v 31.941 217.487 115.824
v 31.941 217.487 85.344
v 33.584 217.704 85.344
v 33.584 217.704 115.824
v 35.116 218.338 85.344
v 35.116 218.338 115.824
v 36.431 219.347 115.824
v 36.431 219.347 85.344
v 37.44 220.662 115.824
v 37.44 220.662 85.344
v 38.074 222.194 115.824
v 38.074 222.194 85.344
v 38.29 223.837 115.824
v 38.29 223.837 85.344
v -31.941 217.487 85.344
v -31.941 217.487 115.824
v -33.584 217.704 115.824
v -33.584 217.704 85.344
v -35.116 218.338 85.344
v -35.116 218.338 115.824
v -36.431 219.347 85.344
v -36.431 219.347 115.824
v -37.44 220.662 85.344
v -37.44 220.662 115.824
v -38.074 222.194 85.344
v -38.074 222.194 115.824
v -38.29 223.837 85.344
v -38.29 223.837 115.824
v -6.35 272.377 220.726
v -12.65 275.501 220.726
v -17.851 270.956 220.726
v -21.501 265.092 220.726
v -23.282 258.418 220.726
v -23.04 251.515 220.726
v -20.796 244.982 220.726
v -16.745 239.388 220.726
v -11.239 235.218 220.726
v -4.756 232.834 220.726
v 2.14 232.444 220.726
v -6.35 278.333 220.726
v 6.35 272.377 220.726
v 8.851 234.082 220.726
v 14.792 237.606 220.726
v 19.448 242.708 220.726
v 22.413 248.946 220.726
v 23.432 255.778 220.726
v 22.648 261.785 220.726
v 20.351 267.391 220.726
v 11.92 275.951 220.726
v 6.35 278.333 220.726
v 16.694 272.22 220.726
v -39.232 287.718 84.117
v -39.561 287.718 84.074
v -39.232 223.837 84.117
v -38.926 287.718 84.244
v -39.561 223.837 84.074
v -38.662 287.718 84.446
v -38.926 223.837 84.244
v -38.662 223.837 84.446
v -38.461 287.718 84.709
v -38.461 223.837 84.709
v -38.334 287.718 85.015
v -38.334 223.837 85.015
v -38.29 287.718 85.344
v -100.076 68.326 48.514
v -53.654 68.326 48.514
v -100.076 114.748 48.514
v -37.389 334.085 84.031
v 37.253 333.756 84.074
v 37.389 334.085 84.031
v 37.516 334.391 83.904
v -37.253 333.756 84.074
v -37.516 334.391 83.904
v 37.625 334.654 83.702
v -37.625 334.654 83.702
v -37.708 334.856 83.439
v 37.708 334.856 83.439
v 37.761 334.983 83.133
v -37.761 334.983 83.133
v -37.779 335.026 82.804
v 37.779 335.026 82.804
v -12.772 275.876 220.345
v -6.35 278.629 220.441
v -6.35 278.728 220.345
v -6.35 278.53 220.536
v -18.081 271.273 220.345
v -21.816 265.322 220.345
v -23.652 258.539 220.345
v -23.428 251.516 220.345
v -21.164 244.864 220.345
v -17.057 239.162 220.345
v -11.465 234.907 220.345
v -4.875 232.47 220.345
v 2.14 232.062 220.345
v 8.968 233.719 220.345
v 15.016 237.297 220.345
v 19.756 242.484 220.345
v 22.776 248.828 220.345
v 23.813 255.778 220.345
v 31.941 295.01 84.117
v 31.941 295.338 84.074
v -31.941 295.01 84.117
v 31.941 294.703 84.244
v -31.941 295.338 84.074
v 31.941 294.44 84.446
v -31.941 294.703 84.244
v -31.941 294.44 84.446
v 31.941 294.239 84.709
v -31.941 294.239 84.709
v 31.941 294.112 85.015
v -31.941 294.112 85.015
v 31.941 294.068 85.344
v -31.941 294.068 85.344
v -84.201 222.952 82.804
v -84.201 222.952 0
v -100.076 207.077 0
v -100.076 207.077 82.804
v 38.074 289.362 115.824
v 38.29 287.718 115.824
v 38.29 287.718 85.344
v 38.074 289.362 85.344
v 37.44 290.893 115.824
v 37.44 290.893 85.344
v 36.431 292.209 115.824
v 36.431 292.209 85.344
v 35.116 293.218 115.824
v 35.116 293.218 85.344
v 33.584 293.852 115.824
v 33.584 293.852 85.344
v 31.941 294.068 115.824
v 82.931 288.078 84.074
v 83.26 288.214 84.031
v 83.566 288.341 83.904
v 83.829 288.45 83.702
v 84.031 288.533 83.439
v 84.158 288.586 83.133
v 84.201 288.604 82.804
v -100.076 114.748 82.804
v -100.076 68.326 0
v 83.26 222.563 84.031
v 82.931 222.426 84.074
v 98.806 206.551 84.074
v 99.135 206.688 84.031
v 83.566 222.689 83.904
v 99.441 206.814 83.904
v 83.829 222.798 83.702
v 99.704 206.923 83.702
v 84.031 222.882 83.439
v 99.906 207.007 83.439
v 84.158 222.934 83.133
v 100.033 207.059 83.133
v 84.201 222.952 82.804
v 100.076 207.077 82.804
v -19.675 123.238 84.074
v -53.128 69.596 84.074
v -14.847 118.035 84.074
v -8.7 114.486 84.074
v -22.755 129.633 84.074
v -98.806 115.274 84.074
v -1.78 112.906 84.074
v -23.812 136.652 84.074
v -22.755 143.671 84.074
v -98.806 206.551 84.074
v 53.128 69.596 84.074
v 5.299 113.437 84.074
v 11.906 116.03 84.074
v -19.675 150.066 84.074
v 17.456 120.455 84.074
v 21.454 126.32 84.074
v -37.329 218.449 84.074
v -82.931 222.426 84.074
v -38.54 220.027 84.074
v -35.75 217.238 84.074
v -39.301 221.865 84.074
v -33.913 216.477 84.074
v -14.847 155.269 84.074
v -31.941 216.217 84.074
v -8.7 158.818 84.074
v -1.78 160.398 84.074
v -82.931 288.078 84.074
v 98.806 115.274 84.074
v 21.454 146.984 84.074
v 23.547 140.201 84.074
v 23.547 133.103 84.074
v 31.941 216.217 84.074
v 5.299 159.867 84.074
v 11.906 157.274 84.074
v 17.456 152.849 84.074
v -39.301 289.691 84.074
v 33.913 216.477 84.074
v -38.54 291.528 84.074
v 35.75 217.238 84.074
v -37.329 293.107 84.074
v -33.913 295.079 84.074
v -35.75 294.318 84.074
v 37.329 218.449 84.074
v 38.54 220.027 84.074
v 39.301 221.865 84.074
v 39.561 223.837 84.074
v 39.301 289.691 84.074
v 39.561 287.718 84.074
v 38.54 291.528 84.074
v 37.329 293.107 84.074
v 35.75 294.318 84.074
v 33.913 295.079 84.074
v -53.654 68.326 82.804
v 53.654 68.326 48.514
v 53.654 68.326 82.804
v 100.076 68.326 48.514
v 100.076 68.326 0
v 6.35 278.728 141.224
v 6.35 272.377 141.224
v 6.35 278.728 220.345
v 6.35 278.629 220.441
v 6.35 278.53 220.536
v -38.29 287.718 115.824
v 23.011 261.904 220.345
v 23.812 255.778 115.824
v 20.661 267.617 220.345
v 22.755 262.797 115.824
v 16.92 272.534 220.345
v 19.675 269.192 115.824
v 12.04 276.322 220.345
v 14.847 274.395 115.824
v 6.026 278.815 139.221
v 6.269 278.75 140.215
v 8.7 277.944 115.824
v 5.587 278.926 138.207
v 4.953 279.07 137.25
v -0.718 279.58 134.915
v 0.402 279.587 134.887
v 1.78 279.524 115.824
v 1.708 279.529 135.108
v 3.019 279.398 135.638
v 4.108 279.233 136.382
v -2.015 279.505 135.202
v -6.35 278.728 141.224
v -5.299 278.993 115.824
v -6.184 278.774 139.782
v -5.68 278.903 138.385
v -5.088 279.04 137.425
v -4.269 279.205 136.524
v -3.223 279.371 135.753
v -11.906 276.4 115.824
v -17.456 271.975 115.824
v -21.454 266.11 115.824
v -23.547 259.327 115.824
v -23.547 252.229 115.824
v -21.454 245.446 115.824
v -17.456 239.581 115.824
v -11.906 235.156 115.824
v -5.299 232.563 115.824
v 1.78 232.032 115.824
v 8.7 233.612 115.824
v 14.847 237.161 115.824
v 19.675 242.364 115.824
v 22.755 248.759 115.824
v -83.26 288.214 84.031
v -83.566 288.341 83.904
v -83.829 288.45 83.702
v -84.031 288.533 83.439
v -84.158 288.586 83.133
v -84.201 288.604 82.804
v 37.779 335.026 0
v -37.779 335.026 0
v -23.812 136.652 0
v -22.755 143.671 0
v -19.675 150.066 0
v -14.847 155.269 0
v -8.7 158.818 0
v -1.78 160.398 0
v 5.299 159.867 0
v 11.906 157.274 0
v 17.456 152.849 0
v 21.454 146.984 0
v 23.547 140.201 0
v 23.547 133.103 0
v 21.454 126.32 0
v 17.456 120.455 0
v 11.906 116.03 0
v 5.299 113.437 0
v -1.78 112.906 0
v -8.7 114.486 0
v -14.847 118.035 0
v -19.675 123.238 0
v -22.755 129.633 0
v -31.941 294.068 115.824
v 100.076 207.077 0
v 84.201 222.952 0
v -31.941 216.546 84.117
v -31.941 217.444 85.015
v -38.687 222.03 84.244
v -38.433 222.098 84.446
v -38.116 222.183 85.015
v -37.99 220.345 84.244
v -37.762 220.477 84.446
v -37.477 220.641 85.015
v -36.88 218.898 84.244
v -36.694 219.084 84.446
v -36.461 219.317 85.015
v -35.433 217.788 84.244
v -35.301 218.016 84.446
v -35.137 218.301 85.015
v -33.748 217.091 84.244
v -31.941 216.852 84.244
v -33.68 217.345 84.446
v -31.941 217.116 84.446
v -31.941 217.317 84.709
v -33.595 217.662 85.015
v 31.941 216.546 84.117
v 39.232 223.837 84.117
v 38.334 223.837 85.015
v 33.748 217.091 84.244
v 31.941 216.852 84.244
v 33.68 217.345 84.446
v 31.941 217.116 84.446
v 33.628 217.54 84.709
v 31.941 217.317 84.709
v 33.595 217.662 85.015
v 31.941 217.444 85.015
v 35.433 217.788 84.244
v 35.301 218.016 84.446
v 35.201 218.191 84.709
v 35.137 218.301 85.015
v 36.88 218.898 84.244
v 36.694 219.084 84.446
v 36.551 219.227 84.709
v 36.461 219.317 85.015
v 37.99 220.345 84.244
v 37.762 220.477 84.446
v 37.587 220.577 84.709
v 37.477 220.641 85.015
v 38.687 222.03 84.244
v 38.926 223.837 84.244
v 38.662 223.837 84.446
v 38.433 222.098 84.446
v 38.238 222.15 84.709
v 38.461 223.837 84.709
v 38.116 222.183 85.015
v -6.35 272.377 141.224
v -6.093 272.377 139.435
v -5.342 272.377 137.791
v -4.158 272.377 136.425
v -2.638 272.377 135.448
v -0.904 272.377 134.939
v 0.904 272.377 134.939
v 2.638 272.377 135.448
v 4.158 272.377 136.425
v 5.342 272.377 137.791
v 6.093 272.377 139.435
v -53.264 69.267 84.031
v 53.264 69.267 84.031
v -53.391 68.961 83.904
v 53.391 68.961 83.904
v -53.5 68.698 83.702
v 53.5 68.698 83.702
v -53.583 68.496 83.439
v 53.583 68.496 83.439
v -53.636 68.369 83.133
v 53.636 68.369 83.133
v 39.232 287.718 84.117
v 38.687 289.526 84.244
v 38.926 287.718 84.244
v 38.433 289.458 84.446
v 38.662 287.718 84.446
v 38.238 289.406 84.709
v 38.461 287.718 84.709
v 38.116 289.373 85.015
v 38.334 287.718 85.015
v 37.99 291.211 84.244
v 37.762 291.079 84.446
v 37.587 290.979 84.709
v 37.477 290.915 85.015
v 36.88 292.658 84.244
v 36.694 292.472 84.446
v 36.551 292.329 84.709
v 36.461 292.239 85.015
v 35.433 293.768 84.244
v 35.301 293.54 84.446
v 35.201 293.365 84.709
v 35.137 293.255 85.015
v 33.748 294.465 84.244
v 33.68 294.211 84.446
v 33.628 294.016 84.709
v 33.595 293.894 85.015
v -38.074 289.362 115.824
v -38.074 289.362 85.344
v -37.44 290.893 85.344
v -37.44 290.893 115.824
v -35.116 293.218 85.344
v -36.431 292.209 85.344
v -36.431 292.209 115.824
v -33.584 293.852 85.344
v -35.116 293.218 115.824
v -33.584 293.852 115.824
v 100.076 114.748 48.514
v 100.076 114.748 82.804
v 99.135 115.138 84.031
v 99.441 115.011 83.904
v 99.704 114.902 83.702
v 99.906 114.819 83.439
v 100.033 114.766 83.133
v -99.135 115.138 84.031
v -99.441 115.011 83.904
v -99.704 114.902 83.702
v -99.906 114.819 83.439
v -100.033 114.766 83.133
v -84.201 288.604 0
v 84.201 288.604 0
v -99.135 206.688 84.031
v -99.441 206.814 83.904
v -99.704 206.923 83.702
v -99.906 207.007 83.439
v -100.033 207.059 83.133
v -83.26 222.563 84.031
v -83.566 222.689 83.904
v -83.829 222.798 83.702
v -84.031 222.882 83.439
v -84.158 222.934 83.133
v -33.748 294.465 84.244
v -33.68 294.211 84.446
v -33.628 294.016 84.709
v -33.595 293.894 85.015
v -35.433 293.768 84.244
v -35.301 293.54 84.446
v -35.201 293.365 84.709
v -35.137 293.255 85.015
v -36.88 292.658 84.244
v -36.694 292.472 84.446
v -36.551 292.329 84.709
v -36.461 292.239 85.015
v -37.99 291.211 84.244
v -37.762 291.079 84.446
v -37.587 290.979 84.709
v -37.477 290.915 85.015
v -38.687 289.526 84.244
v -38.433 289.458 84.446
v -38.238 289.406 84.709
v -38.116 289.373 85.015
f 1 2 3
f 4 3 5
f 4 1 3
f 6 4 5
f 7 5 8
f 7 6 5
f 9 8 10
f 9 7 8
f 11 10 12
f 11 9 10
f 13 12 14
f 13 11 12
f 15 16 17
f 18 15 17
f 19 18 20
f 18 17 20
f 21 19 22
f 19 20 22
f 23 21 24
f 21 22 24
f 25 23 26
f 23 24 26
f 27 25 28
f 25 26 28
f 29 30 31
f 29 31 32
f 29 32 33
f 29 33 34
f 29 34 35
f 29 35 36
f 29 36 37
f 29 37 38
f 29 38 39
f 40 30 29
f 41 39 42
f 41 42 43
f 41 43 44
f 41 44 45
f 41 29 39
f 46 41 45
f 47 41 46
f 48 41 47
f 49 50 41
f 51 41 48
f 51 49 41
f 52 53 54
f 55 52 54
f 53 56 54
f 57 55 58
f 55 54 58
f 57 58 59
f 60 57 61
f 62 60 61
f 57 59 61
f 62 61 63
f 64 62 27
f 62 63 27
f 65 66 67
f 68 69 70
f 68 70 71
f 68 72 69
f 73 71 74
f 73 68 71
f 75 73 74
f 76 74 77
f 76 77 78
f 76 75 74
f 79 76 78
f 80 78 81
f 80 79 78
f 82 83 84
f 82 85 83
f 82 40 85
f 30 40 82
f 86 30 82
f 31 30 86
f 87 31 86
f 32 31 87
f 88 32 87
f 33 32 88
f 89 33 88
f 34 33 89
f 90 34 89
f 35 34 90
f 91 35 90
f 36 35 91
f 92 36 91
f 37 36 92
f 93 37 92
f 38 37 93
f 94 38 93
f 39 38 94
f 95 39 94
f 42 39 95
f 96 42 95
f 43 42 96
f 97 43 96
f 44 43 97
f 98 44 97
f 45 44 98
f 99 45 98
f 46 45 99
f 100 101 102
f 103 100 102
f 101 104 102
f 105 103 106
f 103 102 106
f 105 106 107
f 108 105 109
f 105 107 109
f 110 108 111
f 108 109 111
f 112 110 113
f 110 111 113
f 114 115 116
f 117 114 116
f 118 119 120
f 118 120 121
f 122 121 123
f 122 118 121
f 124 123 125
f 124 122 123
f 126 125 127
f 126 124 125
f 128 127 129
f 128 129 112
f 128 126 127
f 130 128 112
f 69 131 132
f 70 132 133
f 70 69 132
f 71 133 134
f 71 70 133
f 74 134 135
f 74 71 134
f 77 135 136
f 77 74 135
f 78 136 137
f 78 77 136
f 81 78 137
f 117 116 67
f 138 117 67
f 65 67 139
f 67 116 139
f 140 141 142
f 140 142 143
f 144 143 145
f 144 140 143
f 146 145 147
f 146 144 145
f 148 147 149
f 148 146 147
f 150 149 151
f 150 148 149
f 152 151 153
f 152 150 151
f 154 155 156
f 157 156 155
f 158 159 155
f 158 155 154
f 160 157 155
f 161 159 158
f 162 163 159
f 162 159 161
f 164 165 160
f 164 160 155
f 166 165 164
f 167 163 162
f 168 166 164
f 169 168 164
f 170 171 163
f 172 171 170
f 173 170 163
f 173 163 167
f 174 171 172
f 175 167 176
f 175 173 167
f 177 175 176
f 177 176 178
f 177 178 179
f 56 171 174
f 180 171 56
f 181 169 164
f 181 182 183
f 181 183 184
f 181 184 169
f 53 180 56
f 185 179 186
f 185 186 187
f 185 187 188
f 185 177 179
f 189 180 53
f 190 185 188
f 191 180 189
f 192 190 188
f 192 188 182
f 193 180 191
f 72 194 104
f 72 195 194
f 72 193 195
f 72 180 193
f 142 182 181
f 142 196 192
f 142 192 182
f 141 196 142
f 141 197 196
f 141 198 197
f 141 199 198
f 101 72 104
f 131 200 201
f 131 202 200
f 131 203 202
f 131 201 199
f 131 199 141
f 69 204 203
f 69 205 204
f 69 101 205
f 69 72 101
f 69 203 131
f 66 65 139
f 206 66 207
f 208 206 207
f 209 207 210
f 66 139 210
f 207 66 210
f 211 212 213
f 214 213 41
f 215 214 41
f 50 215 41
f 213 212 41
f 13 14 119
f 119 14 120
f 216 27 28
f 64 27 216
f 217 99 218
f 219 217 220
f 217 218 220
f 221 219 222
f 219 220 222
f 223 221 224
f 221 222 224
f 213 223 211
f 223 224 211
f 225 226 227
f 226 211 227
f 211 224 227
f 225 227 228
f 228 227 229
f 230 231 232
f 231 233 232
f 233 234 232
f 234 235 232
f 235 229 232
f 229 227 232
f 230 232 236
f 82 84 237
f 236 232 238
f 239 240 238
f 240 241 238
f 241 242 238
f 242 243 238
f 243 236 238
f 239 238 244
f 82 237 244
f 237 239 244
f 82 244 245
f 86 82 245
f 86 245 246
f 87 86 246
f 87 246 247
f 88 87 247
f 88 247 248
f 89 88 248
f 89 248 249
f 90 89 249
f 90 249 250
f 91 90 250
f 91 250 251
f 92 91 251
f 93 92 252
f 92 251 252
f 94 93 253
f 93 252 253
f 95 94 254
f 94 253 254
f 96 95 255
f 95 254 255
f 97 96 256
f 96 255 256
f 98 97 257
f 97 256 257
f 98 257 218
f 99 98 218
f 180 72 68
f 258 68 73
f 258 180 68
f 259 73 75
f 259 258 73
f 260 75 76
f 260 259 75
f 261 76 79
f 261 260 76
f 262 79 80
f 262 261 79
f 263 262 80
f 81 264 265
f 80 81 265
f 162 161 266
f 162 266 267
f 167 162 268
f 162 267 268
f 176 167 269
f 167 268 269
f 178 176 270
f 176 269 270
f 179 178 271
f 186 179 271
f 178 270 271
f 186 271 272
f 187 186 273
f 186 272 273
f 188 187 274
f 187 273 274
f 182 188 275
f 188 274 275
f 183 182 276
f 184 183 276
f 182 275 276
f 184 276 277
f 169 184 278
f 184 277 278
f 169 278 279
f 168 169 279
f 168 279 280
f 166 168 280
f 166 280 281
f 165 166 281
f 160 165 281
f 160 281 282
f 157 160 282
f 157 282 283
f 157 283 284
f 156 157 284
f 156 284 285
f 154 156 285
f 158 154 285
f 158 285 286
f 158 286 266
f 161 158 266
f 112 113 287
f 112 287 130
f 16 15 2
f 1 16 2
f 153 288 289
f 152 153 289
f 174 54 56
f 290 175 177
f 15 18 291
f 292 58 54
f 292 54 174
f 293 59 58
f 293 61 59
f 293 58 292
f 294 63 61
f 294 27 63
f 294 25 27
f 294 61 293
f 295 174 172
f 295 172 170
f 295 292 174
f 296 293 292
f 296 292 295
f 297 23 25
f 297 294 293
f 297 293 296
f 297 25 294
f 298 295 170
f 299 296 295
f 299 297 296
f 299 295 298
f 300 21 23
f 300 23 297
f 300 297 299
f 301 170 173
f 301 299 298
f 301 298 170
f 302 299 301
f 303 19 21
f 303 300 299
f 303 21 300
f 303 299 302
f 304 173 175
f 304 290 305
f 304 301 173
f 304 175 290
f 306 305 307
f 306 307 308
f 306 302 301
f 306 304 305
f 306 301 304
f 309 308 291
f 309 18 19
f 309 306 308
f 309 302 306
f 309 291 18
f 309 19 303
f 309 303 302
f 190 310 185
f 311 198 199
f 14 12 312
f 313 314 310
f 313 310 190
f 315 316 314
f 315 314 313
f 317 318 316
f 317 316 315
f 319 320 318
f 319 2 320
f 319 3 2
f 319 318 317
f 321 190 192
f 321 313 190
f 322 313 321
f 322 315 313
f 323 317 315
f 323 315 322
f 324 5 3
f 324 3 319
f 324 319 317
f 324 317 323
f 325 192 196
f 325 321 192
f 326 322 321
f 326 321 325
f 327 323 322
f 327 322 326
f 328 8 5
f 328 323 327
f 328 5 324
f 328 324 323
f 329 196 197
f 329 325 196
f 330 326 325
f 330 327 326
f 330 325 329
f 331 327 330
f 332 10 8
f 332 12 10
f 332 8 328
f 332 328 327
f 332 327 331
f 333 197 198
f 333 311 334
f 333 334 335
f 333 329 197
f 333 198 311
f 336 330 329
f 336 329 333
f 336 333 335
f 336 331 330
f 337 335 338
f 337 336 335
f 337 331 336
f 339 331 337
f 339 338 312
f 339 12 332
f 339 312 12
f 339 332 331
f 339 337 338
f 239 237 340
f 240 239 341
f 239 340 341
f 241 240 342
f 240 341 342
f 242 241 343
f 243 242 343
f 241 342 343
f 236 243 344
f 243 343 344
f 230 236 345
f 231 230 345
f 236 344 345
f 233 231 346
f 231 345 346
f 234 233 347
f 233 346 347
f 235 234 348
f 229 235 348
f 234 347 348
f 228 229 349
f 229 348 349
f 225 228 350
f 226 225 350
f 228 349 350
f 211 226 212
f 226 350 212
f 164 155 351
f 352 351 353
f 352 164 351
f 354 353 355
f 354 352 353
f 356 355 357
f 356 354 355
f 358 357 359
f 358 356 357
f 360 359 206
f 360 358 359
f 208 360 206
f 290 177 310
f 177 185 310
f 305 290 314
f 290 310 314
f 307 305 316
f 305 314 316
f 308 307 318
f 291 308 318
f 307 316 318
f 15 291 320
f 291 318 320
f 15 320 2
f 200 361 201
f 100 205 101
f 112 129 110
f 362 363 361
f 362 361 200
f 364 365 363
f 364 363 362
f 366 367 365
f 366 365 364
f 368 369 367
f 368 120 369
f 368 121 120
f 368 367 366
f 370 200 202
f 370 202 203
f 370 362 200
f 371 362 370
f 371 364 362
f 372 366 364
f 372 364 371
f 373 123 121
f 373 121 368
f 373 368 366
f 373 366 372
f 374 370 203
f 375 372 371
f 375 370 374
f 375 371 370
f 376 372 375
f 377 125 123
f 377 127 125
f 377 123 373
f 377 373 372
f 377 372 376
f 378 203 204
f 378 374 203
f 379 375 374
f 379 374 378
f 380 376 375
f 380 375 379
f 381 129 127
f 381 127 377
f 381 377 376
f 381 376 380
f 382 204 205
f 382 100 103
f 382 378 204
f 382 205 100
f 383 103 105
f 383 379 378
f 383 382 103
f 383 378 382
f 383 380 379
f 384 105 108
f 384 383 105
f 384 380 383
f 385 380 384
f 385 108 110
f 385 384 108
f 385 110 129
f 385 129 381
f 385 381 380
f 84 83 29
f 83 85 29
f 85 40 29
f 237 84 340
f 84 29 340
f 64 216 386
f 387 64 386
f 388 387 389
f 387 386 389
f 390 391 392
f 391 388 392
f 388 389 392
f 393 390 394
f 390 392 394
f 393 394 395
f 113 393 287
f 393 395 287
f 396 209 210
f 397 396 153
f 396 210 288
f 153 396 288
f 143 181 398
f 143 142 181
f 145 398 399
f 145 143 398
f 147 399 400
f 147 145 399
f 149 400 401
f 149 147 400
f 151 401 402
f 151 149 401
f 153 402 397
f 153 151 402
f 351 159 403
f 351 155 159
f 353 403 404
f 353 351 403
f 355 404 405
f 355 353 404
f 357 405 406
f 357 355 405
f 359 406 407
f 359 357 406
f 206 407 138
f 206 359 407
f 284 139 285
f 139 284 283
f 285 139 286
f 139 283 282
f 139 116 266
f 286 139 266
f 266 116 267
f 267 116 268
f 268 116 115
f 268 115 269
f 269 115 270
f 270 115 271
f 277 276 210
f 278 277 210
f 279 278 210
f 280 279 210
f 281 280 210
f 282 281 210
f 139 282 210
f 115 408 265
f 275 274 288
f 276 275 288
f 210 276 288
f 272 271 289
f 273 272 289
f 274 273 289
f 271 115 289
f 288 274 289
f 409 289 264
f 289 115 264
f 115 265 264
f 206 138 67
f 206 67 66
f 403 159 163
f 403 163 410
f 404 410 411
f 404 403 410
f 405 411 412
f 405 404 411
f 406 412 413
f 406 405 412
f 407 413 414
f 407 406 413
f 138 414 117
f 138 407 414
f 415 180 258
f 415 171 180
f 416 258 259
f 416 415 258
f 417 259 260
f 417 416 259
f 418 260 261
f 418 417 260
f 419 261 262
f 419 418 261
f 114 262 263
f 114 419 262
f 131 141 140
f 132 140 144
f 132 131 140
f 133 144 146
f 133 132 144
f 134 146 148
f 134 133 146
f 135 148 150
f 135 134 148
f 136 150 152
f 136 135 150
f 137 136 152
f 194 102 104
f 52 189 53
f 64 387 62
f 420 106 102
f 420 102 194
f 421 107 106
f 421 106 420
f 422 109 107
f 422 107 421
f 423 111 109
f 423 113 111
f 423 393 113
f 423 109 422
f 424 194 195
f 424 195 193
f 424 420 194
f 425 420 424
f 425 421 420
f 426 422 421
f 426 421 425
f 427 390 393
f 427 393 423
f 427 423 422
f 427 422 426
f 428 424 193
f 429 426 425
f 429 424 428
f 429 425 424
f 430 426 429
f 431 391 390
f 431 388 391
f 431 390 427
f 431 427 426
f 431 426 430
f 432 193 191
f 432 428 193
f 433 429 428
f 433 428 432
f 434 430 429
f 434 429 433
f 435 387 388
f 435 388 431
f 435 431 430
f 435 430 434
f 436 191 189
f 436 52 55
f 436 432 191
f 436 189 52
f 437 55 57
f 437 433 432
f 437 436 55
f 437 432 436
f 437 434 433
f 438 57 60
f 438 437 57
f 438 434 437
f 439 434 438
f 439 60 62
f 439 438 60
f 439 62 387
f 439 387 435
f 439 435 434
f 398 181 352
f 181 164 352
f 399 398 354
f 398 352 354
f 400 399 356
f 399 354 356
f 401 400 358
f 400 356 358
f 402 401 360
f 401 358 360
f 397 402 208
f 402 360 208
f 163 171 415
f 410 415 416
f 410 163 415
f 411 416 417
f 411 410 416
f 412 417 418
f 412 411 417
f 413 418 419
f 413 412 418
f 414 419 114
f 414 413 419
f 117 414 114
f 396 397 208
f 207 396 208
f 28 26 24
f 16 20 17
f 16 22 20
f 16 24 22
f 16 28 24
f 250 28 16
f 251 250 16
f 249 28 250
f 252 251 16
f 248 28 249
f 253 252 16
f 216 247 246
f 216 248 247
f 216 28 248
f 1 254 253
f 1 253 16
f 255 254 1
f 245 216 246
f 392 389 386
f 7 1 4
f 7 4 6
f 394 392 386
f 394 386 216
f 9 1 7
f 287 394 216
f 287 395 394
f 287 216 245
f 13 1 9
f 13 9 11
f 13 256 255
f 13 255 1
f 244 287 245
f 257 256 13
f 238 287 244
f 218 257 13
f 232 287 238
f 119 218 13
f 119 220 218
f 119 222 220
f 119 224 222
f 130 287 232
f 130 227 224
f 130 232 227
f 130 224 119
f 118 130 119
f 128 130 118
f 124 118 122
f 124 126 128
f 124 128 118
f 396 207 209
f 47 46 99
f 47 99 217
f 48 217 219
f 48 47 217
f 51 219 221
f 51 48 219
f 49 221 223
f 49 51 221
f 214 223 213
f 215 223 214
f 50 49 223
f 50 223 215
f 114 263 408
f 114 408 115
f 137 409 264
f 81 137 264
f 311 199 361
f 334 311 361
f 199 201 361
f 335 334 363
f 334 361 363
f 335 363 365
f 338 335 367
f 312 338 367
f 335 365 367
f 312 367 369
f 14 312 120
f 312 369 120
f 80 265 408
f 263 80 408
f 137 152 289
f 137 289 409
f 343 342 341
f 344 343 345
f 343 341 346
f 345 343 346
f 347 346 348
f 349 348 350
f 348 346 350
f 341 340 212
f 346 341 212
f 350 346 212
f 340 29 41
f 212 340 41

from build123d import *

# Parameters (mm, degrees)
BOSS_EXTRUDE1_DEPTH = 84.074
SKETCH3_W           = 76.581
SKETCH3_H           = 76.581
BOSS_EXTRUDE2_DEPTH = 31.75
SKETCH_D_R          = 23.8125
BOSS_EXTRUDE3_DEPTH = 104.902
CUT_EXTRUDE1_DEPTH  = 35.56
FILLET1_R           = 6.35
FILLET2_R           = 1.27
KEYWAY_START        = 16.5989
KEYWAY_DEPTH        = 63.6491
CHAMFER1_SIZE       = 0.381
SKETCH7_R           = 23.8125
CUT_EXTRUDE3_DEPTH  = 221.726


with BuildPart() as part:
    # L,M → Boss-Extrude1 (new body)
    with BuildSketch(Plane.XY):
        Polygon((-100.076, 68.326), (100.076, 68.326), (100.076, 207.077403609), (84.201, 222.952403609), (84.201, 288.603596391), (37.778596391, 335.026), (-37.778596391, 335.026), (-84.201, 288.603596391), (-84.201, 222.952403609), (-100.076, 207.077403609), align=None)
    extrude(amount=BOSS_EXTRUDE1_DEPTH)

    # Sketch3 → Boss-Extrude2 (add)
    with BuildSketch(Plane.XY.offset(84.074)):
        with Locations((0, 255.778)):
            Rectangle(SKETCH3_W, SKETCH3_H)
    extrude(amount=BOSS_EXTRUDE2_DEPTH)

    # D → Boss-Extrude3 (add)
    with BuildSketch(Plane.XY.offset(115.824)):
        with Locations((0, 255.778)):
            Circle(SKETCH_D_R)
    extrude(amount=BOSS_EXTRUDE3_DEPTH)

    # Sketch5 → Cut-Extrude1 (cut)
    with BuildSketch(Plane.XY.offset(84.074)):
        Polygon((100.076, 114.748403609), (53.653596391, 68.326), (100.076, 68.326), align=None)
        Polygon((-100.076, 68.326), (-100.076, 114.748403609), (-53.653596391, 68.326), align=None)
    extrude(amount=-CUT_EXTRUDE1_DEPTH, mode=Mode.SUBTRACT)

    # Fillet1
    fillet1_edges = [part.edges().sort_by_distance(p)[0] for p in [
        (-38.2905, 294.0685, 99.949),
        (-38.2905, 217.4875, 99.949),
        (38.2905, 217.4875, 99.949),
        (38.2905, 294.0685, 99.949),
    ]]
    fillet(fillet1_edges, radius=FILLET1_R)

    # Fillet2
    fillet2_edges = [part.edges().sort_by_distance(p)[0] for p in [
        (100.076, 160.912903609, 84.074),
        (76.864798195, 91.537201805, 84.074),
        (92.1385, 215.014903609, 84.074),
        (84.201, 255.778, 84.074),
        (60.989798195, 311.814798195, 84.074),
        (0, 335.026, 84.074),
        (0, 68.326, 84.074),
        (-60.989798195, 311.814798195, 84.074),
        (-84.201, 255.778, 84.074),
        (-92.1385, 215.014903609, 84.074),
        (-100.076, 160.912903609, 84.074),
        (-76.864798195, 91.537201805, 84.074),
        (0, 217.4875, 84.074),
        (-38.2905, 255.778, 84.074),
        (38.2905, 255.778, 84.074),
        (0, 294.0685, 84.074),
        (-36.430628061, 219.347371939, 84.074),
        (36.430628061, 219.347371939, 84.074),
        (-36.430628061, 292.208628061, 84.074),
        (36.430628061, 292.208628061, 84.074),
    ]]
    fillet(fillet2_edges, radius=FILLET2_R)

    # Sketch6 → Keyway (cut, through all)
    with BuildSketch(Plane(origin=(0, 255.778, 0), x_dir=(-1, 0, 0), z_dir=(0, 1, 0)).offset(KEYWAY_START)):
        with BuildLine():
            Line((6.35, 220.726), (6.35, 141.224))
            ThreePointArc((6.35, 141.224), (0, 134.874), (-6.35, 141.224))
            Line((-6.35, 141.224), (-6.35, 220.726))
            ThreePointArc((-6.35, 220.726), (0, 227.076), (6.35, 220.726))
        make_face()
    extrude(amount=KEYWAY_DEPTH, mode=Mode.SUBTRACT)

    # Chamfer1
    chamfer1_edges = [part.edges().sort_by_distance(p)[0] for p in [
        (-14.419184811, 236.827478487, 220.726),
    ]]
    chamfer(chamfer1_edges, length=CHAMFER1_SIZE)

    # Sketch7 → Cut-Extrude3 (cut, through all)
    with BuildSketch(Plane(origin=(0, 0, 0), x_dir=(-1, 0, 0), z_dir=(0, 0, -1))):
        with Locations((0, 136.652)):
            Circle(SKETCH7_R)
    extrude(amount=-CUT_EXTRUDE3_DEPTH, mode=Mode.SUBTRACT)


solid = part.part
